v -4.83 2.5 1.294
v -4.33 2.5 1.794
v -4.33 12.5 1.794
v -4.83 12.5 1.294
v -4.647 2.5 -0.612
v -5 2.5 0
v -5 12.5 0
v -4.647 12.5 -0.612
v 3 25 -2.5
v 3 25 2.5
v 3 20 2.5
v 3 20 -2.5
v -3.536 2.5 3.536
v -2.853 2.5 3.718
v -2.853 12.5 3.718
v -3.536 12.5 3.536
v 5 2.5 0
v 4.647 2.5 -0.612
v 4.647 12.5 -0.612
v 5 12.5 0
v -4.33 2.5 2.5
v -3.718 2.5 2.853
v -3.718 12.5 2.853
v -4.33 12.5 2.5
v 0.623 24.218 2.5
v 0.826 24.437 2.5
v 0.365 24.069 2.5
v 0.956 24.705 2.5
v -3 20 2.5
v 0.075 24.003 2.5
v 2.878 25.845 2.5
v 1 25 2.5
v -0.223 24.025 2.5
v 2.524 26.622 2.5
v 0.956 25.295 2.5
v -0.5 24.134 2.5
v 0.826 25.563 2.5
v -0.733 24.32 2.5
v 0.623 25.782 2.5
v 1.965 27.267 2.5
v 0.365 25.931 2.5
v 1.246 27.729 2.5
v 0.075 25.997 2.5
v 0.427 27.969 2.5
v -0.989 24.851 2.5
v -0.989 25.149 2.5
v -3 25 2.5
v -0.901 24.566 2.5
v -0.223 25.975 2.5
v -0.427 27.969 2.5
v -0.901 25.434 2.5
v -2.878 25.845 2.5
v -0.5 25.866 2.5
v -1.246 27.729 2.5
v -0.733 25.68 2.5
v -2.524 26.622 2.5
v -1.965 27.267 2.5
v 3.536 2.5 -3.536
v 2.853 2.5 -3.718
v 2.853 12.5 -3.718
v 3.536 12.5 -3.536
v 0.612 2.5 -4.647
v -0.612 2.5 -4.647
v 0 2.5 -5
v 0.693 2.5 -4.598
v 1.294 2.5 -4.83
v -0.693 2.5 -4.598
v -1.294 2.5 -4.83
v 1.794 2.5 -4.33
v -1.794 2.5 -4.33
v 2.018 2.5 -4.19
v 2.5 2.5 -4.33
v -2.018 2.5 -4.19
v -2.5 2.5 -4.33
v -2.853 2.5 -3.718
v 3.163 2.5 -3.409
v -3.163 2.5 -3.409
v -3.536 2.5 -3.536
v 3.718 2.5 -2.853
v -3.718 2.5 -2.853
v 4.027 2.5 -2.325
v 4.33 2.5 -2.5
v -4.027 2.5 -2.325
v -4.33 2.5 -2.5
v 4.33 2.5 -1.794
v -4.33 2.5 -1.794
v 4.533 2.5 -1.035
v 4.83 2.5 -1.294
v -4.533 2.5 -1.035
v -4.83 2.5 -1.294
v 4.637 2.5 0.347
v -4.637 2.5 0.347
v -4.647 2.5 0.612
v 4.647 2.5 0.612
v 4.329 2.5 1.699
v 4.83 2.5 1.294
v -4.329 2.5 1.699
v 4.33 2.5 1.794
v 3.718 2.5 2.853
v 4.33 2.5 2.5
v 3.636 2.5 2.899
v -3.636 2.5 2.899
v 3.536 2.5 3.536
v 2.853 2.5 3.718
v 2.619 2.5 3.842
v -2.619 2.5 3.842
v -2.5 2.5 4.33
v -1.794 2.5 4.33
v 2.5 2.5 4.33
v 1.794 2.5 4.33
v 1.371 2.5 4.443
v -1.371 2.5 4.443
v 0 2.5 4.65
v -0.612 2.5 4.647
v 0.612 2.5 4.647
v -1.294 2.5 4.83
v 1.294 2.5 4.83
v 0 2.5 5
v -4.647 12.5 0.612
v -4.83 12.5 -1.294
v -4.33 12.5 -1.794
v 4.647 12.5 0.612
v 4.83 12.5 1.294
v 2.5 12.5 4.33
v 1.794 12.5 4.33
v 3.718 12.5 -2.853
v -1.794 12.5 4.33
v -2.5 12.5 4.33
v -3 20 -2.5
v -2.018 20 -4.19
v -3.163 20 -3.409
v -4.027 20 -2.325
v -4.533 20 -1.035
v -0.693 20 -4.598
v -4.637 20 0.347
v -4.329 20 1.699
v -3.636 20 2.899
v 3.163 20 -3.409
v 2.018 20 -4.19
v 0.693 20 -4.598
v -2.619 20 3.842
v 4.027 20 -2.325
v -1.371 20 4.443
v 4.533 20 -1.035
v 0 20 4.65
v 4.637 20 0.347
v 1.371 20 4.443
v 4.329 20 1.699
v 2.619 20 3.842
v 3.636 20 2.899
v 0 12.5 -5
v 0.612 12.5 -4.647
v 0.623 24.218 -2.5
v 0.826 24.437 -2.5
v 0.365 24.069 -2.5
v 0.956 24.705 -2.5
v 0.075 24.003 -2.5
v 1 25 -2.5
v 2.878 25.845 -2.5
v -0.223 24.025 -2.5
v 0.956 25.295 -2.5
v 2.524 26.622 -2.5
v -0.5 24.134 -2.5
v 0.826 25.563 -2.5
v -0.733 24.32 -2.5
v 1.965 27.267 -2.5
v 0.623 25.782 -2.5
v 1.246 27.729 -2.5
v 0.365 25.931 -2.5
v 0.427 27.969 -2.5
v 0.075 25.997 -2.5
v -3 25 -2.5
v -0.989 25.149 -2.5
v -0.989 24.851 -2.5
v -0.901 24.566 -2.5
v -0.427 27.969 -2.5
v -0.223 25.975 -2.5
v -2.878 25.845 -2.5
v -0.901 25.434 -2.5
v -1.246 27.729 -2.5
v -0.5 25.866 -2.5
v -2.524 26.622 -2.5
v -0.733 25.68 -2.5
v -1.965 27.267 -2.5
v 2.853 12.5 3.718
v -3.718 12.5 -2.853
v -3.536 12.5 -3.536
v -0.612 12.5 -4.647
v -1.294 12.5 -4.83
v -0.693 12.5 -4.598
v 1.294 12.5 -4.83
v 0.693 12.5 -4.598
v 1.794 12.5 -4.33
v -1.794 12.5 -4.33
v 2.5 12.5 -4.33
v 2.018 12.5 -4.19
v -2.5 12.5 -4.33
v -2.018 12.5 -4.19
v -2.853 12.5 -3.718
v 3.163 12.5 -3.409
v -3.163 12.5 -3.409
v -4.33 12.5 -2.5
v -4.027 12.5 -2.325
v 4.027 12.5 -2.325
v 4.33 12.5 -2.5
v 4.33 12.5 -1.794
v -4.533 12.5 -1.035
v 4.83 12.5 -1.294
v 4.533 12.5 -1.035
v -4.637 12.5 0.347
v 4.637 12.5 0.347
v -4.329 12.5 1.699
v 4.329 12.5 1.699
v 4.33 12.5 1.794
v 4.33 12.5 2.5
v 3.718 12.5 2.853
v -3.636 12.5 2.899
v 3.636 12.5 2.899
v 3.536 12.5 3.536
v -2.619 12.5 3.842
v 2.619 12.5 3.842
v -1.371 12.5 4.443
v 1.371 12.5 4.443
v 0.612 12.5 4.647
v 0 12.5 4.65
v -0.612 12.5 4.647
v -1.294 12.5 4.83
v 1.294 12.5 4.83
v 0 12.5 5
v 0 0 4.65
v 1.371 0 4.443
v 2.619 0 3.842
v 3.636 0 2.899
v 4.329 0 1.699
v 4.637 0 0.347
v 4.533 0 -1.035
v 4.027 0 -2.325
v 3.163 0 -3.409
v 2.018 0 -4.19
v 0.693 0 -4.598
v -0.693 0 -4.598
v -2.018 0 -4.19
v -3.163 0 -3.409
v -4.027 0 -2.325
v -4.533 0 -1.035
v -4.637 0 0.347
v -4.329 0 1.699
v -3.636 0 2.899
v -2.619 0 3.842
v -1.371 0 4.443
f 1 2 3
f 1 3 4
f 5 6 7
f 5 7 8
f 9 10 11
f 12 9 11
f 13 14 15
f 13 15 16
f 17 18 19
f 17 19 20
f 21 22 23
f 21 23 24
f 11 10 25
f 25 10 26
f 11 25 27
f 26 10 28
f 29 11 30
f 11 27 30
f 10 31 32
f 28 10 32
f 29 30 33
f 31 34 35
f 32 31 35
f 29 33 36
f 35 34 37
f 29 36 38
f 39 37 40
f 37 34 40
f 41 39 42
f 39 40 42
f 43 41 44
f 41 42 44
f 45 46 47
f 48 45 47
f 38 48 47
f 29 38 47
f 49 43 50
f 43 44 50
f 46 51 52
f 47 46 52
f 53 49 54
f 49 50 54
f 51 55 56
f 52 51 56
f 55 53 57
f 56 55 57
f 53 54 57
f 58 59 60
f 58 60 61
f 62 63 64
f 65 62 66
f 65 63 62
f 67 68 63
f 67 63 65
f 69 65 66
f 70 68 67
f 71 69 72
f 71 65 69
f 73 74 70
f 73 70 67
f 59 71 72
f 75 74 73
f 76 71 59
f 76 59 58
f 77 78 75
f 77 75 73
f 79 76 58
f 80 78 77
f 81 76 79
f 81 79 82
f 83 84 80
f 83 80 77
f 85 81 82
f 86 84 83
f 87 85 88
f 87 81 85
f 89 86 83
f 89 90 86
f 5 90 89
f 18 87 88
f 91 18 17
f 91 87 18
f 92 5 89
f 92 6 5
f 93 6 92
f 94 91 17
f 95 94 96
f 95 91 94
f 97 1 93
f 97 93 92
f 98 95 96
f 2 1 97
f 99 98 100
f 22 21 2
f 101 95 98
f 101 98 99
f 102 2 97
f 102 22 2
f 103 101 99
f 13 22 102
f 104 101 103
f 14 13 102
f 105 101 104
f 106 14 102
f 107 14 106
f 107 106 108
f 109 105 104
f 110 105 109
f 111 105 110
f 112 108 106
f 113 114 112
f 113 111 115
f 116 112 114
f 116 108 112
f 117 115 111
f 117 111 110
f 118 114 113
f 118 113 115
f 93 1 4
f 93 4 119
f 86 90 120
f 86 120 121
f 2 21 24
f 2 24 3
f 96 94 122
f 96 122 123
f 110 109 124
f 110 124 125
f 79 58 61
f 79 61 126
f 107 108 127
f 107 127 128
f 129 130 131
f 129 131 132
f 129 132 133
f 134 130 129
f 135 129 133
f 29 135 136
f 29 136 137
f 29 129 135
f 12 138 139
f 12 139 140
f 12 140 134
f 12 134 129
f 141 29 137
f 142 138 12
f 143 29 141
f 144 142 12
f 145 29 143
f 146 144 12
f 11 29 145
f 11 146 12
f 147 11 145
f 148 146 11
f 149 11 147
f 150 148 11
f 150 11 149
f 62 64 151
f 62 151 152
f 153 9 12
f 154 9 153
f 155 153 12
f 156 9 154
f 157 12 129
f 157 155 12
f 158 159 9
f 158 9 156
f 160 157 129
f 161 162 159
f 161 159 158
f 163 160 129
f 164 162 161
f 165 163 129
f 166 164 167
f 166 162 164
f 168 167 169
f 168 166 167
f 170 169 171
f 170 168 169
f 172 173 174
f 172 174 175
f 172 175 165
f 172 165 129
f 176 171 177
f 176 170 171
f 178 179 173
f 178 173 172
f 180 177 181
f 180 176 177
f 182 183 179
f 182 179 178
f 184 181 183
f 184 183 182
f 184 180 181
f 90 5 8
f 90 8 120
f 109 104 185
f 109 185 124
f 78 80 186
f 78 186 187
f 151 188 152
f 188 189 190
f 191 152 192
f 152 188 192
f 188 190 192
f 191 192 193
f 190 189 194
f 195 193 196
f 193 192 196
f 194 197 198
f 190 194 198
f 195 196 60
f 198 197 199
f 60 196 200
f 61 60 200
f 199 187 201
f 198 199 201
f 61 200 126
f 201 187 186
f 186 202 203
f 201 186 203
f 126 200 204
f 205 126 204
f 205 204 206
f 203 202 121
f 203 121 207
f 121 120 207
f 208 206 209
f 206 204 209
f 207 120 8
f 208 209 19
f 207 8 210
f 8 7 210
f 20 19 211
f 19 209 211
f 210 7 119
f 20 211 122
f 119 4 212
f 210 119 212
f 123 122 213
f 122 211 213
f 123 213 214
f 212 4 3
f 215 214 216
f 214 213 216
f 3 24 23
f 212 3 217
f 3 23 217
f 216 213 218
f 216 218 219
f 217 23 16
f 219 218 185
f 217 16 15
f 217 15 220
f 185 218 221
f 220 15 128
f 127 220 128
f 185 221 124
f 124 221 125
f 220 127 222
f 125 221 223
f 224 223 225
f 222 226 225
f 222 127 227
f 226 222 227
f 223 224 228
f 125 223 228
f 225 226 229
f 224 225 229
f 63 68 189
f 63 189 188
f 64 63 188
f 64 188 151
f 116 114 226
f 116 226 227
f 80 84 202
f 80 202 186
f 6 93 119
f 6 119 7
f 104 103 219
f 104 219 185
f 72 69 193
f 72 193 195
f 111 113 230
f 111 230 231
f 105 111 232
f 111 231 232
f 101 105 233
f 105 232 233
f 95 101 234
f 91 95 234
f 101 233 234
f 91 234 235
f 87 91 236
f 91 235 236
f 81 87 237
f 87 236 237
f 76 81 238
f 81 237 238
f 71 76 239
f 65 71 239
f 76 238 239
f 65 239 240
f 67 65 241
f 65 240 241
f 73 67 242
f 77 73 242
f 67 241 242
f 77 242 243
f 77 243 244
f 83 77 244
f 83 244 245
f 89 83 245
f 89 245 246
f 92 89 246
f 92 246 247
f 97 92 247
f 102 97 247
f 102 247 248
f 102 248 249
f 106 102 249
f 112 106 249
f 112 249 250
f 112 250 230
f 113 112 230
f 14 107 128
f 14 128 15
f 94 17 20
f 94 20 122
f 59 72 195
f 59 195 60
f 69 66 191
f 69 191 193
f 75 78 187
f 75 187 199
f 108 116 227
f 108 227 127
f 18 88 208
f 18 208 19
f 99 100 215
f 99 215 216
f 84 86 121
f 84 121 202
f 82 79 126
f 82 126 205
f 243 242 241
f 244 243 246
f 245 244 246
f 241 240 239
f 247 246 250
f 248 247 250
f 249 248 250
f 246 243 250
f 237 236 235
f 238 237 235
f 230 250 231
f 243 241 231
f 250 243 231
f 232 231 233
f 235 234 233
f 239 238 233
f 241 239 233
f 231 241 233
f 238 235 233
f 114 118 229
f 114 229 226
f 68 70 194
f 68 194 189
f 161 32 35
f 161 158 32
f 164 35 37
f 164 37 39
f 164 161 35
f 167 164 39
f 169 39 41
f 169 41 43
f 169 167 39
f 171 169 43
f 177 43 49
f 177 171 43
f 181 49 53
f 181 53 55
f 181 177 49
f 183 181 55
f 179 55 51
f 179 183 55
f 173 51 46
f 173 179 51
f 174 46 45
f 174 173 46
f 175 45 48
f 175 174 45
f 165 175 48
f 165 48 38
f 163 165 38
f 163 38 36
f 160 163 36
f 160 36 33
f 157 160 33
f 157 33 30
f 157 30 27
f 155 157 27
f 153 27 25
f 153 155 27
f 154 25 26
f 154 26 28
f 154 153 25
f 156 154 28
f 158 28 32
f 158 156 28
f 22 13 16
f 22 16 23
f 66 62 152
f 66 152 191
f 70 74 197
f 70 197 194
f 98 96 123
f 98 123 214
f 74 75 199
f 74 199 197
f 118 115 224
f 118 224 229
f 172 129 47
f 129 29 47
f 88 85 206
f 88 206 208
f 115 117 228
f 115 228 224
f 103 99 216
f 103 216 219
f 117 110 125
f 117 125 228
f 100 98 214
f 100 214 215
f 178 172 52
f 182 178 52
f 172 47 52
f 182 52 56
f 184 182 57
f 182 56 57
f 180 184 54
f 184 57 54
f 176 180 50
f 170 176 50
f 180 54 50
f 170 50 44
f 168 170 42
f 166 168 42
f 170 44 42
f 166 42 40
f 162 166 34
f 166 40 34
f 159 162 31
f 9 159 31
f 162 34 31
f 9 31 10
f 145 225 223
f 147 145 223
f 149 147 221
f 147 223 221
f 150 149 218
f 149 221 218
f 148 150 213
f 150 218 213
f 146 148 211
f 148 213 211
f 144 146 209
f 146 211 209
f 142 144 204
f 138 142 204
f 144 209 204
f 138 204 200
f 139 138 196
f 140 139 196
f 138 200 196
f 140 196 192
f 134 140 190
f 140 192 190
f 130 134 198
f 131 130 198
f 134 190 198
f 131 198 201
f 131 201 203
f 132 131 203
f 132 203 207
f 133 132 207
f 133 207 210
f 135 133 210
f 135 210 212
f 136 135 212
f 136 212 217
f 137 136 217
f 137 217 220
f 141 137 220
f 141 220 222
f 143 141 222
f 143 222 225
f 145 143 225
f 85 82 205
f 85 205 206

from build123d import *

# Parameters (mm, degrees)
SKETCH3_R           = 4.65
BOSS_EXTRUDE1_DEPTH = 20
SKETCH4_R           = 1
BOSS_EXTRUDE2_DEPTH = 2.5
BOSS_EXTRUDE3_START = -2.5
BOSS_EXTRUDE3_DEPTH = 10
CIRPATTERN1_COUNT   = 4
CIRPATTERN1_ANGLE   = 45


with BuildPart() as part:
    # Sketch3 → Boss-Extrude1 (new body)
    with BuildSketch(Plane(origin=(0, 0, 0), x_dir=(1, 0, 0), z_dir=(0, 1, 0))):
        with Locations(Location((0, 0, 0), (0, 0, 270))):
            Circle(SKETCH3_R)
    extrude(amount=BOSS_EXTRUDE1_DEPTH)

    # Sketch4 → Boss-Extrude2 (add, symmetric)
    with BuildSketch(Plane.XY):
        with BuildLine():
            Line((3, 20), (-3, 20))
            Line((-3, 20), (-3, 25))
            ThreePointArc((-3, 25), (0, 28), (3, 25))
            Line((3, 25), (3, 20))
        make_face()
        with Locations((0, 25)):
            Circle(SKETCH4_R, mode=Mode.SUBTRACT)
    extrude(amount=BOSS_EXTRUDE2_DEPTH, both=True)

    # Sketch5 → Boss-Extrude3 (add)
    with BuildSketch(Plane.XZ.offset(BOSS_EXTRUDE3_START)):
        Polygon((-5, 0), (-2.5, -4.330127019), (2.5, -4.330127019), (5, 0), (2.5, 4.330127019), (-2.5, 4.330127019), align=None)
    boss_extrude3 = extrude(amount=-BOSS_EXTRUDE3_DEPTH)

    # CirPattern1: Boss-Extrude3 ×4 about axis
    cirpattern1_axis = Axis((0, 0, 0), (0, -1, 0))
    for i in range(1, CIRPATTERN1_COUNT):
        add(boss_extrude3.rotate(cirpattern1_axis, i * CIRPATTERN1_ANGLE / (CIRPATTERN1_COUNT - 1)))


solid = part.part
